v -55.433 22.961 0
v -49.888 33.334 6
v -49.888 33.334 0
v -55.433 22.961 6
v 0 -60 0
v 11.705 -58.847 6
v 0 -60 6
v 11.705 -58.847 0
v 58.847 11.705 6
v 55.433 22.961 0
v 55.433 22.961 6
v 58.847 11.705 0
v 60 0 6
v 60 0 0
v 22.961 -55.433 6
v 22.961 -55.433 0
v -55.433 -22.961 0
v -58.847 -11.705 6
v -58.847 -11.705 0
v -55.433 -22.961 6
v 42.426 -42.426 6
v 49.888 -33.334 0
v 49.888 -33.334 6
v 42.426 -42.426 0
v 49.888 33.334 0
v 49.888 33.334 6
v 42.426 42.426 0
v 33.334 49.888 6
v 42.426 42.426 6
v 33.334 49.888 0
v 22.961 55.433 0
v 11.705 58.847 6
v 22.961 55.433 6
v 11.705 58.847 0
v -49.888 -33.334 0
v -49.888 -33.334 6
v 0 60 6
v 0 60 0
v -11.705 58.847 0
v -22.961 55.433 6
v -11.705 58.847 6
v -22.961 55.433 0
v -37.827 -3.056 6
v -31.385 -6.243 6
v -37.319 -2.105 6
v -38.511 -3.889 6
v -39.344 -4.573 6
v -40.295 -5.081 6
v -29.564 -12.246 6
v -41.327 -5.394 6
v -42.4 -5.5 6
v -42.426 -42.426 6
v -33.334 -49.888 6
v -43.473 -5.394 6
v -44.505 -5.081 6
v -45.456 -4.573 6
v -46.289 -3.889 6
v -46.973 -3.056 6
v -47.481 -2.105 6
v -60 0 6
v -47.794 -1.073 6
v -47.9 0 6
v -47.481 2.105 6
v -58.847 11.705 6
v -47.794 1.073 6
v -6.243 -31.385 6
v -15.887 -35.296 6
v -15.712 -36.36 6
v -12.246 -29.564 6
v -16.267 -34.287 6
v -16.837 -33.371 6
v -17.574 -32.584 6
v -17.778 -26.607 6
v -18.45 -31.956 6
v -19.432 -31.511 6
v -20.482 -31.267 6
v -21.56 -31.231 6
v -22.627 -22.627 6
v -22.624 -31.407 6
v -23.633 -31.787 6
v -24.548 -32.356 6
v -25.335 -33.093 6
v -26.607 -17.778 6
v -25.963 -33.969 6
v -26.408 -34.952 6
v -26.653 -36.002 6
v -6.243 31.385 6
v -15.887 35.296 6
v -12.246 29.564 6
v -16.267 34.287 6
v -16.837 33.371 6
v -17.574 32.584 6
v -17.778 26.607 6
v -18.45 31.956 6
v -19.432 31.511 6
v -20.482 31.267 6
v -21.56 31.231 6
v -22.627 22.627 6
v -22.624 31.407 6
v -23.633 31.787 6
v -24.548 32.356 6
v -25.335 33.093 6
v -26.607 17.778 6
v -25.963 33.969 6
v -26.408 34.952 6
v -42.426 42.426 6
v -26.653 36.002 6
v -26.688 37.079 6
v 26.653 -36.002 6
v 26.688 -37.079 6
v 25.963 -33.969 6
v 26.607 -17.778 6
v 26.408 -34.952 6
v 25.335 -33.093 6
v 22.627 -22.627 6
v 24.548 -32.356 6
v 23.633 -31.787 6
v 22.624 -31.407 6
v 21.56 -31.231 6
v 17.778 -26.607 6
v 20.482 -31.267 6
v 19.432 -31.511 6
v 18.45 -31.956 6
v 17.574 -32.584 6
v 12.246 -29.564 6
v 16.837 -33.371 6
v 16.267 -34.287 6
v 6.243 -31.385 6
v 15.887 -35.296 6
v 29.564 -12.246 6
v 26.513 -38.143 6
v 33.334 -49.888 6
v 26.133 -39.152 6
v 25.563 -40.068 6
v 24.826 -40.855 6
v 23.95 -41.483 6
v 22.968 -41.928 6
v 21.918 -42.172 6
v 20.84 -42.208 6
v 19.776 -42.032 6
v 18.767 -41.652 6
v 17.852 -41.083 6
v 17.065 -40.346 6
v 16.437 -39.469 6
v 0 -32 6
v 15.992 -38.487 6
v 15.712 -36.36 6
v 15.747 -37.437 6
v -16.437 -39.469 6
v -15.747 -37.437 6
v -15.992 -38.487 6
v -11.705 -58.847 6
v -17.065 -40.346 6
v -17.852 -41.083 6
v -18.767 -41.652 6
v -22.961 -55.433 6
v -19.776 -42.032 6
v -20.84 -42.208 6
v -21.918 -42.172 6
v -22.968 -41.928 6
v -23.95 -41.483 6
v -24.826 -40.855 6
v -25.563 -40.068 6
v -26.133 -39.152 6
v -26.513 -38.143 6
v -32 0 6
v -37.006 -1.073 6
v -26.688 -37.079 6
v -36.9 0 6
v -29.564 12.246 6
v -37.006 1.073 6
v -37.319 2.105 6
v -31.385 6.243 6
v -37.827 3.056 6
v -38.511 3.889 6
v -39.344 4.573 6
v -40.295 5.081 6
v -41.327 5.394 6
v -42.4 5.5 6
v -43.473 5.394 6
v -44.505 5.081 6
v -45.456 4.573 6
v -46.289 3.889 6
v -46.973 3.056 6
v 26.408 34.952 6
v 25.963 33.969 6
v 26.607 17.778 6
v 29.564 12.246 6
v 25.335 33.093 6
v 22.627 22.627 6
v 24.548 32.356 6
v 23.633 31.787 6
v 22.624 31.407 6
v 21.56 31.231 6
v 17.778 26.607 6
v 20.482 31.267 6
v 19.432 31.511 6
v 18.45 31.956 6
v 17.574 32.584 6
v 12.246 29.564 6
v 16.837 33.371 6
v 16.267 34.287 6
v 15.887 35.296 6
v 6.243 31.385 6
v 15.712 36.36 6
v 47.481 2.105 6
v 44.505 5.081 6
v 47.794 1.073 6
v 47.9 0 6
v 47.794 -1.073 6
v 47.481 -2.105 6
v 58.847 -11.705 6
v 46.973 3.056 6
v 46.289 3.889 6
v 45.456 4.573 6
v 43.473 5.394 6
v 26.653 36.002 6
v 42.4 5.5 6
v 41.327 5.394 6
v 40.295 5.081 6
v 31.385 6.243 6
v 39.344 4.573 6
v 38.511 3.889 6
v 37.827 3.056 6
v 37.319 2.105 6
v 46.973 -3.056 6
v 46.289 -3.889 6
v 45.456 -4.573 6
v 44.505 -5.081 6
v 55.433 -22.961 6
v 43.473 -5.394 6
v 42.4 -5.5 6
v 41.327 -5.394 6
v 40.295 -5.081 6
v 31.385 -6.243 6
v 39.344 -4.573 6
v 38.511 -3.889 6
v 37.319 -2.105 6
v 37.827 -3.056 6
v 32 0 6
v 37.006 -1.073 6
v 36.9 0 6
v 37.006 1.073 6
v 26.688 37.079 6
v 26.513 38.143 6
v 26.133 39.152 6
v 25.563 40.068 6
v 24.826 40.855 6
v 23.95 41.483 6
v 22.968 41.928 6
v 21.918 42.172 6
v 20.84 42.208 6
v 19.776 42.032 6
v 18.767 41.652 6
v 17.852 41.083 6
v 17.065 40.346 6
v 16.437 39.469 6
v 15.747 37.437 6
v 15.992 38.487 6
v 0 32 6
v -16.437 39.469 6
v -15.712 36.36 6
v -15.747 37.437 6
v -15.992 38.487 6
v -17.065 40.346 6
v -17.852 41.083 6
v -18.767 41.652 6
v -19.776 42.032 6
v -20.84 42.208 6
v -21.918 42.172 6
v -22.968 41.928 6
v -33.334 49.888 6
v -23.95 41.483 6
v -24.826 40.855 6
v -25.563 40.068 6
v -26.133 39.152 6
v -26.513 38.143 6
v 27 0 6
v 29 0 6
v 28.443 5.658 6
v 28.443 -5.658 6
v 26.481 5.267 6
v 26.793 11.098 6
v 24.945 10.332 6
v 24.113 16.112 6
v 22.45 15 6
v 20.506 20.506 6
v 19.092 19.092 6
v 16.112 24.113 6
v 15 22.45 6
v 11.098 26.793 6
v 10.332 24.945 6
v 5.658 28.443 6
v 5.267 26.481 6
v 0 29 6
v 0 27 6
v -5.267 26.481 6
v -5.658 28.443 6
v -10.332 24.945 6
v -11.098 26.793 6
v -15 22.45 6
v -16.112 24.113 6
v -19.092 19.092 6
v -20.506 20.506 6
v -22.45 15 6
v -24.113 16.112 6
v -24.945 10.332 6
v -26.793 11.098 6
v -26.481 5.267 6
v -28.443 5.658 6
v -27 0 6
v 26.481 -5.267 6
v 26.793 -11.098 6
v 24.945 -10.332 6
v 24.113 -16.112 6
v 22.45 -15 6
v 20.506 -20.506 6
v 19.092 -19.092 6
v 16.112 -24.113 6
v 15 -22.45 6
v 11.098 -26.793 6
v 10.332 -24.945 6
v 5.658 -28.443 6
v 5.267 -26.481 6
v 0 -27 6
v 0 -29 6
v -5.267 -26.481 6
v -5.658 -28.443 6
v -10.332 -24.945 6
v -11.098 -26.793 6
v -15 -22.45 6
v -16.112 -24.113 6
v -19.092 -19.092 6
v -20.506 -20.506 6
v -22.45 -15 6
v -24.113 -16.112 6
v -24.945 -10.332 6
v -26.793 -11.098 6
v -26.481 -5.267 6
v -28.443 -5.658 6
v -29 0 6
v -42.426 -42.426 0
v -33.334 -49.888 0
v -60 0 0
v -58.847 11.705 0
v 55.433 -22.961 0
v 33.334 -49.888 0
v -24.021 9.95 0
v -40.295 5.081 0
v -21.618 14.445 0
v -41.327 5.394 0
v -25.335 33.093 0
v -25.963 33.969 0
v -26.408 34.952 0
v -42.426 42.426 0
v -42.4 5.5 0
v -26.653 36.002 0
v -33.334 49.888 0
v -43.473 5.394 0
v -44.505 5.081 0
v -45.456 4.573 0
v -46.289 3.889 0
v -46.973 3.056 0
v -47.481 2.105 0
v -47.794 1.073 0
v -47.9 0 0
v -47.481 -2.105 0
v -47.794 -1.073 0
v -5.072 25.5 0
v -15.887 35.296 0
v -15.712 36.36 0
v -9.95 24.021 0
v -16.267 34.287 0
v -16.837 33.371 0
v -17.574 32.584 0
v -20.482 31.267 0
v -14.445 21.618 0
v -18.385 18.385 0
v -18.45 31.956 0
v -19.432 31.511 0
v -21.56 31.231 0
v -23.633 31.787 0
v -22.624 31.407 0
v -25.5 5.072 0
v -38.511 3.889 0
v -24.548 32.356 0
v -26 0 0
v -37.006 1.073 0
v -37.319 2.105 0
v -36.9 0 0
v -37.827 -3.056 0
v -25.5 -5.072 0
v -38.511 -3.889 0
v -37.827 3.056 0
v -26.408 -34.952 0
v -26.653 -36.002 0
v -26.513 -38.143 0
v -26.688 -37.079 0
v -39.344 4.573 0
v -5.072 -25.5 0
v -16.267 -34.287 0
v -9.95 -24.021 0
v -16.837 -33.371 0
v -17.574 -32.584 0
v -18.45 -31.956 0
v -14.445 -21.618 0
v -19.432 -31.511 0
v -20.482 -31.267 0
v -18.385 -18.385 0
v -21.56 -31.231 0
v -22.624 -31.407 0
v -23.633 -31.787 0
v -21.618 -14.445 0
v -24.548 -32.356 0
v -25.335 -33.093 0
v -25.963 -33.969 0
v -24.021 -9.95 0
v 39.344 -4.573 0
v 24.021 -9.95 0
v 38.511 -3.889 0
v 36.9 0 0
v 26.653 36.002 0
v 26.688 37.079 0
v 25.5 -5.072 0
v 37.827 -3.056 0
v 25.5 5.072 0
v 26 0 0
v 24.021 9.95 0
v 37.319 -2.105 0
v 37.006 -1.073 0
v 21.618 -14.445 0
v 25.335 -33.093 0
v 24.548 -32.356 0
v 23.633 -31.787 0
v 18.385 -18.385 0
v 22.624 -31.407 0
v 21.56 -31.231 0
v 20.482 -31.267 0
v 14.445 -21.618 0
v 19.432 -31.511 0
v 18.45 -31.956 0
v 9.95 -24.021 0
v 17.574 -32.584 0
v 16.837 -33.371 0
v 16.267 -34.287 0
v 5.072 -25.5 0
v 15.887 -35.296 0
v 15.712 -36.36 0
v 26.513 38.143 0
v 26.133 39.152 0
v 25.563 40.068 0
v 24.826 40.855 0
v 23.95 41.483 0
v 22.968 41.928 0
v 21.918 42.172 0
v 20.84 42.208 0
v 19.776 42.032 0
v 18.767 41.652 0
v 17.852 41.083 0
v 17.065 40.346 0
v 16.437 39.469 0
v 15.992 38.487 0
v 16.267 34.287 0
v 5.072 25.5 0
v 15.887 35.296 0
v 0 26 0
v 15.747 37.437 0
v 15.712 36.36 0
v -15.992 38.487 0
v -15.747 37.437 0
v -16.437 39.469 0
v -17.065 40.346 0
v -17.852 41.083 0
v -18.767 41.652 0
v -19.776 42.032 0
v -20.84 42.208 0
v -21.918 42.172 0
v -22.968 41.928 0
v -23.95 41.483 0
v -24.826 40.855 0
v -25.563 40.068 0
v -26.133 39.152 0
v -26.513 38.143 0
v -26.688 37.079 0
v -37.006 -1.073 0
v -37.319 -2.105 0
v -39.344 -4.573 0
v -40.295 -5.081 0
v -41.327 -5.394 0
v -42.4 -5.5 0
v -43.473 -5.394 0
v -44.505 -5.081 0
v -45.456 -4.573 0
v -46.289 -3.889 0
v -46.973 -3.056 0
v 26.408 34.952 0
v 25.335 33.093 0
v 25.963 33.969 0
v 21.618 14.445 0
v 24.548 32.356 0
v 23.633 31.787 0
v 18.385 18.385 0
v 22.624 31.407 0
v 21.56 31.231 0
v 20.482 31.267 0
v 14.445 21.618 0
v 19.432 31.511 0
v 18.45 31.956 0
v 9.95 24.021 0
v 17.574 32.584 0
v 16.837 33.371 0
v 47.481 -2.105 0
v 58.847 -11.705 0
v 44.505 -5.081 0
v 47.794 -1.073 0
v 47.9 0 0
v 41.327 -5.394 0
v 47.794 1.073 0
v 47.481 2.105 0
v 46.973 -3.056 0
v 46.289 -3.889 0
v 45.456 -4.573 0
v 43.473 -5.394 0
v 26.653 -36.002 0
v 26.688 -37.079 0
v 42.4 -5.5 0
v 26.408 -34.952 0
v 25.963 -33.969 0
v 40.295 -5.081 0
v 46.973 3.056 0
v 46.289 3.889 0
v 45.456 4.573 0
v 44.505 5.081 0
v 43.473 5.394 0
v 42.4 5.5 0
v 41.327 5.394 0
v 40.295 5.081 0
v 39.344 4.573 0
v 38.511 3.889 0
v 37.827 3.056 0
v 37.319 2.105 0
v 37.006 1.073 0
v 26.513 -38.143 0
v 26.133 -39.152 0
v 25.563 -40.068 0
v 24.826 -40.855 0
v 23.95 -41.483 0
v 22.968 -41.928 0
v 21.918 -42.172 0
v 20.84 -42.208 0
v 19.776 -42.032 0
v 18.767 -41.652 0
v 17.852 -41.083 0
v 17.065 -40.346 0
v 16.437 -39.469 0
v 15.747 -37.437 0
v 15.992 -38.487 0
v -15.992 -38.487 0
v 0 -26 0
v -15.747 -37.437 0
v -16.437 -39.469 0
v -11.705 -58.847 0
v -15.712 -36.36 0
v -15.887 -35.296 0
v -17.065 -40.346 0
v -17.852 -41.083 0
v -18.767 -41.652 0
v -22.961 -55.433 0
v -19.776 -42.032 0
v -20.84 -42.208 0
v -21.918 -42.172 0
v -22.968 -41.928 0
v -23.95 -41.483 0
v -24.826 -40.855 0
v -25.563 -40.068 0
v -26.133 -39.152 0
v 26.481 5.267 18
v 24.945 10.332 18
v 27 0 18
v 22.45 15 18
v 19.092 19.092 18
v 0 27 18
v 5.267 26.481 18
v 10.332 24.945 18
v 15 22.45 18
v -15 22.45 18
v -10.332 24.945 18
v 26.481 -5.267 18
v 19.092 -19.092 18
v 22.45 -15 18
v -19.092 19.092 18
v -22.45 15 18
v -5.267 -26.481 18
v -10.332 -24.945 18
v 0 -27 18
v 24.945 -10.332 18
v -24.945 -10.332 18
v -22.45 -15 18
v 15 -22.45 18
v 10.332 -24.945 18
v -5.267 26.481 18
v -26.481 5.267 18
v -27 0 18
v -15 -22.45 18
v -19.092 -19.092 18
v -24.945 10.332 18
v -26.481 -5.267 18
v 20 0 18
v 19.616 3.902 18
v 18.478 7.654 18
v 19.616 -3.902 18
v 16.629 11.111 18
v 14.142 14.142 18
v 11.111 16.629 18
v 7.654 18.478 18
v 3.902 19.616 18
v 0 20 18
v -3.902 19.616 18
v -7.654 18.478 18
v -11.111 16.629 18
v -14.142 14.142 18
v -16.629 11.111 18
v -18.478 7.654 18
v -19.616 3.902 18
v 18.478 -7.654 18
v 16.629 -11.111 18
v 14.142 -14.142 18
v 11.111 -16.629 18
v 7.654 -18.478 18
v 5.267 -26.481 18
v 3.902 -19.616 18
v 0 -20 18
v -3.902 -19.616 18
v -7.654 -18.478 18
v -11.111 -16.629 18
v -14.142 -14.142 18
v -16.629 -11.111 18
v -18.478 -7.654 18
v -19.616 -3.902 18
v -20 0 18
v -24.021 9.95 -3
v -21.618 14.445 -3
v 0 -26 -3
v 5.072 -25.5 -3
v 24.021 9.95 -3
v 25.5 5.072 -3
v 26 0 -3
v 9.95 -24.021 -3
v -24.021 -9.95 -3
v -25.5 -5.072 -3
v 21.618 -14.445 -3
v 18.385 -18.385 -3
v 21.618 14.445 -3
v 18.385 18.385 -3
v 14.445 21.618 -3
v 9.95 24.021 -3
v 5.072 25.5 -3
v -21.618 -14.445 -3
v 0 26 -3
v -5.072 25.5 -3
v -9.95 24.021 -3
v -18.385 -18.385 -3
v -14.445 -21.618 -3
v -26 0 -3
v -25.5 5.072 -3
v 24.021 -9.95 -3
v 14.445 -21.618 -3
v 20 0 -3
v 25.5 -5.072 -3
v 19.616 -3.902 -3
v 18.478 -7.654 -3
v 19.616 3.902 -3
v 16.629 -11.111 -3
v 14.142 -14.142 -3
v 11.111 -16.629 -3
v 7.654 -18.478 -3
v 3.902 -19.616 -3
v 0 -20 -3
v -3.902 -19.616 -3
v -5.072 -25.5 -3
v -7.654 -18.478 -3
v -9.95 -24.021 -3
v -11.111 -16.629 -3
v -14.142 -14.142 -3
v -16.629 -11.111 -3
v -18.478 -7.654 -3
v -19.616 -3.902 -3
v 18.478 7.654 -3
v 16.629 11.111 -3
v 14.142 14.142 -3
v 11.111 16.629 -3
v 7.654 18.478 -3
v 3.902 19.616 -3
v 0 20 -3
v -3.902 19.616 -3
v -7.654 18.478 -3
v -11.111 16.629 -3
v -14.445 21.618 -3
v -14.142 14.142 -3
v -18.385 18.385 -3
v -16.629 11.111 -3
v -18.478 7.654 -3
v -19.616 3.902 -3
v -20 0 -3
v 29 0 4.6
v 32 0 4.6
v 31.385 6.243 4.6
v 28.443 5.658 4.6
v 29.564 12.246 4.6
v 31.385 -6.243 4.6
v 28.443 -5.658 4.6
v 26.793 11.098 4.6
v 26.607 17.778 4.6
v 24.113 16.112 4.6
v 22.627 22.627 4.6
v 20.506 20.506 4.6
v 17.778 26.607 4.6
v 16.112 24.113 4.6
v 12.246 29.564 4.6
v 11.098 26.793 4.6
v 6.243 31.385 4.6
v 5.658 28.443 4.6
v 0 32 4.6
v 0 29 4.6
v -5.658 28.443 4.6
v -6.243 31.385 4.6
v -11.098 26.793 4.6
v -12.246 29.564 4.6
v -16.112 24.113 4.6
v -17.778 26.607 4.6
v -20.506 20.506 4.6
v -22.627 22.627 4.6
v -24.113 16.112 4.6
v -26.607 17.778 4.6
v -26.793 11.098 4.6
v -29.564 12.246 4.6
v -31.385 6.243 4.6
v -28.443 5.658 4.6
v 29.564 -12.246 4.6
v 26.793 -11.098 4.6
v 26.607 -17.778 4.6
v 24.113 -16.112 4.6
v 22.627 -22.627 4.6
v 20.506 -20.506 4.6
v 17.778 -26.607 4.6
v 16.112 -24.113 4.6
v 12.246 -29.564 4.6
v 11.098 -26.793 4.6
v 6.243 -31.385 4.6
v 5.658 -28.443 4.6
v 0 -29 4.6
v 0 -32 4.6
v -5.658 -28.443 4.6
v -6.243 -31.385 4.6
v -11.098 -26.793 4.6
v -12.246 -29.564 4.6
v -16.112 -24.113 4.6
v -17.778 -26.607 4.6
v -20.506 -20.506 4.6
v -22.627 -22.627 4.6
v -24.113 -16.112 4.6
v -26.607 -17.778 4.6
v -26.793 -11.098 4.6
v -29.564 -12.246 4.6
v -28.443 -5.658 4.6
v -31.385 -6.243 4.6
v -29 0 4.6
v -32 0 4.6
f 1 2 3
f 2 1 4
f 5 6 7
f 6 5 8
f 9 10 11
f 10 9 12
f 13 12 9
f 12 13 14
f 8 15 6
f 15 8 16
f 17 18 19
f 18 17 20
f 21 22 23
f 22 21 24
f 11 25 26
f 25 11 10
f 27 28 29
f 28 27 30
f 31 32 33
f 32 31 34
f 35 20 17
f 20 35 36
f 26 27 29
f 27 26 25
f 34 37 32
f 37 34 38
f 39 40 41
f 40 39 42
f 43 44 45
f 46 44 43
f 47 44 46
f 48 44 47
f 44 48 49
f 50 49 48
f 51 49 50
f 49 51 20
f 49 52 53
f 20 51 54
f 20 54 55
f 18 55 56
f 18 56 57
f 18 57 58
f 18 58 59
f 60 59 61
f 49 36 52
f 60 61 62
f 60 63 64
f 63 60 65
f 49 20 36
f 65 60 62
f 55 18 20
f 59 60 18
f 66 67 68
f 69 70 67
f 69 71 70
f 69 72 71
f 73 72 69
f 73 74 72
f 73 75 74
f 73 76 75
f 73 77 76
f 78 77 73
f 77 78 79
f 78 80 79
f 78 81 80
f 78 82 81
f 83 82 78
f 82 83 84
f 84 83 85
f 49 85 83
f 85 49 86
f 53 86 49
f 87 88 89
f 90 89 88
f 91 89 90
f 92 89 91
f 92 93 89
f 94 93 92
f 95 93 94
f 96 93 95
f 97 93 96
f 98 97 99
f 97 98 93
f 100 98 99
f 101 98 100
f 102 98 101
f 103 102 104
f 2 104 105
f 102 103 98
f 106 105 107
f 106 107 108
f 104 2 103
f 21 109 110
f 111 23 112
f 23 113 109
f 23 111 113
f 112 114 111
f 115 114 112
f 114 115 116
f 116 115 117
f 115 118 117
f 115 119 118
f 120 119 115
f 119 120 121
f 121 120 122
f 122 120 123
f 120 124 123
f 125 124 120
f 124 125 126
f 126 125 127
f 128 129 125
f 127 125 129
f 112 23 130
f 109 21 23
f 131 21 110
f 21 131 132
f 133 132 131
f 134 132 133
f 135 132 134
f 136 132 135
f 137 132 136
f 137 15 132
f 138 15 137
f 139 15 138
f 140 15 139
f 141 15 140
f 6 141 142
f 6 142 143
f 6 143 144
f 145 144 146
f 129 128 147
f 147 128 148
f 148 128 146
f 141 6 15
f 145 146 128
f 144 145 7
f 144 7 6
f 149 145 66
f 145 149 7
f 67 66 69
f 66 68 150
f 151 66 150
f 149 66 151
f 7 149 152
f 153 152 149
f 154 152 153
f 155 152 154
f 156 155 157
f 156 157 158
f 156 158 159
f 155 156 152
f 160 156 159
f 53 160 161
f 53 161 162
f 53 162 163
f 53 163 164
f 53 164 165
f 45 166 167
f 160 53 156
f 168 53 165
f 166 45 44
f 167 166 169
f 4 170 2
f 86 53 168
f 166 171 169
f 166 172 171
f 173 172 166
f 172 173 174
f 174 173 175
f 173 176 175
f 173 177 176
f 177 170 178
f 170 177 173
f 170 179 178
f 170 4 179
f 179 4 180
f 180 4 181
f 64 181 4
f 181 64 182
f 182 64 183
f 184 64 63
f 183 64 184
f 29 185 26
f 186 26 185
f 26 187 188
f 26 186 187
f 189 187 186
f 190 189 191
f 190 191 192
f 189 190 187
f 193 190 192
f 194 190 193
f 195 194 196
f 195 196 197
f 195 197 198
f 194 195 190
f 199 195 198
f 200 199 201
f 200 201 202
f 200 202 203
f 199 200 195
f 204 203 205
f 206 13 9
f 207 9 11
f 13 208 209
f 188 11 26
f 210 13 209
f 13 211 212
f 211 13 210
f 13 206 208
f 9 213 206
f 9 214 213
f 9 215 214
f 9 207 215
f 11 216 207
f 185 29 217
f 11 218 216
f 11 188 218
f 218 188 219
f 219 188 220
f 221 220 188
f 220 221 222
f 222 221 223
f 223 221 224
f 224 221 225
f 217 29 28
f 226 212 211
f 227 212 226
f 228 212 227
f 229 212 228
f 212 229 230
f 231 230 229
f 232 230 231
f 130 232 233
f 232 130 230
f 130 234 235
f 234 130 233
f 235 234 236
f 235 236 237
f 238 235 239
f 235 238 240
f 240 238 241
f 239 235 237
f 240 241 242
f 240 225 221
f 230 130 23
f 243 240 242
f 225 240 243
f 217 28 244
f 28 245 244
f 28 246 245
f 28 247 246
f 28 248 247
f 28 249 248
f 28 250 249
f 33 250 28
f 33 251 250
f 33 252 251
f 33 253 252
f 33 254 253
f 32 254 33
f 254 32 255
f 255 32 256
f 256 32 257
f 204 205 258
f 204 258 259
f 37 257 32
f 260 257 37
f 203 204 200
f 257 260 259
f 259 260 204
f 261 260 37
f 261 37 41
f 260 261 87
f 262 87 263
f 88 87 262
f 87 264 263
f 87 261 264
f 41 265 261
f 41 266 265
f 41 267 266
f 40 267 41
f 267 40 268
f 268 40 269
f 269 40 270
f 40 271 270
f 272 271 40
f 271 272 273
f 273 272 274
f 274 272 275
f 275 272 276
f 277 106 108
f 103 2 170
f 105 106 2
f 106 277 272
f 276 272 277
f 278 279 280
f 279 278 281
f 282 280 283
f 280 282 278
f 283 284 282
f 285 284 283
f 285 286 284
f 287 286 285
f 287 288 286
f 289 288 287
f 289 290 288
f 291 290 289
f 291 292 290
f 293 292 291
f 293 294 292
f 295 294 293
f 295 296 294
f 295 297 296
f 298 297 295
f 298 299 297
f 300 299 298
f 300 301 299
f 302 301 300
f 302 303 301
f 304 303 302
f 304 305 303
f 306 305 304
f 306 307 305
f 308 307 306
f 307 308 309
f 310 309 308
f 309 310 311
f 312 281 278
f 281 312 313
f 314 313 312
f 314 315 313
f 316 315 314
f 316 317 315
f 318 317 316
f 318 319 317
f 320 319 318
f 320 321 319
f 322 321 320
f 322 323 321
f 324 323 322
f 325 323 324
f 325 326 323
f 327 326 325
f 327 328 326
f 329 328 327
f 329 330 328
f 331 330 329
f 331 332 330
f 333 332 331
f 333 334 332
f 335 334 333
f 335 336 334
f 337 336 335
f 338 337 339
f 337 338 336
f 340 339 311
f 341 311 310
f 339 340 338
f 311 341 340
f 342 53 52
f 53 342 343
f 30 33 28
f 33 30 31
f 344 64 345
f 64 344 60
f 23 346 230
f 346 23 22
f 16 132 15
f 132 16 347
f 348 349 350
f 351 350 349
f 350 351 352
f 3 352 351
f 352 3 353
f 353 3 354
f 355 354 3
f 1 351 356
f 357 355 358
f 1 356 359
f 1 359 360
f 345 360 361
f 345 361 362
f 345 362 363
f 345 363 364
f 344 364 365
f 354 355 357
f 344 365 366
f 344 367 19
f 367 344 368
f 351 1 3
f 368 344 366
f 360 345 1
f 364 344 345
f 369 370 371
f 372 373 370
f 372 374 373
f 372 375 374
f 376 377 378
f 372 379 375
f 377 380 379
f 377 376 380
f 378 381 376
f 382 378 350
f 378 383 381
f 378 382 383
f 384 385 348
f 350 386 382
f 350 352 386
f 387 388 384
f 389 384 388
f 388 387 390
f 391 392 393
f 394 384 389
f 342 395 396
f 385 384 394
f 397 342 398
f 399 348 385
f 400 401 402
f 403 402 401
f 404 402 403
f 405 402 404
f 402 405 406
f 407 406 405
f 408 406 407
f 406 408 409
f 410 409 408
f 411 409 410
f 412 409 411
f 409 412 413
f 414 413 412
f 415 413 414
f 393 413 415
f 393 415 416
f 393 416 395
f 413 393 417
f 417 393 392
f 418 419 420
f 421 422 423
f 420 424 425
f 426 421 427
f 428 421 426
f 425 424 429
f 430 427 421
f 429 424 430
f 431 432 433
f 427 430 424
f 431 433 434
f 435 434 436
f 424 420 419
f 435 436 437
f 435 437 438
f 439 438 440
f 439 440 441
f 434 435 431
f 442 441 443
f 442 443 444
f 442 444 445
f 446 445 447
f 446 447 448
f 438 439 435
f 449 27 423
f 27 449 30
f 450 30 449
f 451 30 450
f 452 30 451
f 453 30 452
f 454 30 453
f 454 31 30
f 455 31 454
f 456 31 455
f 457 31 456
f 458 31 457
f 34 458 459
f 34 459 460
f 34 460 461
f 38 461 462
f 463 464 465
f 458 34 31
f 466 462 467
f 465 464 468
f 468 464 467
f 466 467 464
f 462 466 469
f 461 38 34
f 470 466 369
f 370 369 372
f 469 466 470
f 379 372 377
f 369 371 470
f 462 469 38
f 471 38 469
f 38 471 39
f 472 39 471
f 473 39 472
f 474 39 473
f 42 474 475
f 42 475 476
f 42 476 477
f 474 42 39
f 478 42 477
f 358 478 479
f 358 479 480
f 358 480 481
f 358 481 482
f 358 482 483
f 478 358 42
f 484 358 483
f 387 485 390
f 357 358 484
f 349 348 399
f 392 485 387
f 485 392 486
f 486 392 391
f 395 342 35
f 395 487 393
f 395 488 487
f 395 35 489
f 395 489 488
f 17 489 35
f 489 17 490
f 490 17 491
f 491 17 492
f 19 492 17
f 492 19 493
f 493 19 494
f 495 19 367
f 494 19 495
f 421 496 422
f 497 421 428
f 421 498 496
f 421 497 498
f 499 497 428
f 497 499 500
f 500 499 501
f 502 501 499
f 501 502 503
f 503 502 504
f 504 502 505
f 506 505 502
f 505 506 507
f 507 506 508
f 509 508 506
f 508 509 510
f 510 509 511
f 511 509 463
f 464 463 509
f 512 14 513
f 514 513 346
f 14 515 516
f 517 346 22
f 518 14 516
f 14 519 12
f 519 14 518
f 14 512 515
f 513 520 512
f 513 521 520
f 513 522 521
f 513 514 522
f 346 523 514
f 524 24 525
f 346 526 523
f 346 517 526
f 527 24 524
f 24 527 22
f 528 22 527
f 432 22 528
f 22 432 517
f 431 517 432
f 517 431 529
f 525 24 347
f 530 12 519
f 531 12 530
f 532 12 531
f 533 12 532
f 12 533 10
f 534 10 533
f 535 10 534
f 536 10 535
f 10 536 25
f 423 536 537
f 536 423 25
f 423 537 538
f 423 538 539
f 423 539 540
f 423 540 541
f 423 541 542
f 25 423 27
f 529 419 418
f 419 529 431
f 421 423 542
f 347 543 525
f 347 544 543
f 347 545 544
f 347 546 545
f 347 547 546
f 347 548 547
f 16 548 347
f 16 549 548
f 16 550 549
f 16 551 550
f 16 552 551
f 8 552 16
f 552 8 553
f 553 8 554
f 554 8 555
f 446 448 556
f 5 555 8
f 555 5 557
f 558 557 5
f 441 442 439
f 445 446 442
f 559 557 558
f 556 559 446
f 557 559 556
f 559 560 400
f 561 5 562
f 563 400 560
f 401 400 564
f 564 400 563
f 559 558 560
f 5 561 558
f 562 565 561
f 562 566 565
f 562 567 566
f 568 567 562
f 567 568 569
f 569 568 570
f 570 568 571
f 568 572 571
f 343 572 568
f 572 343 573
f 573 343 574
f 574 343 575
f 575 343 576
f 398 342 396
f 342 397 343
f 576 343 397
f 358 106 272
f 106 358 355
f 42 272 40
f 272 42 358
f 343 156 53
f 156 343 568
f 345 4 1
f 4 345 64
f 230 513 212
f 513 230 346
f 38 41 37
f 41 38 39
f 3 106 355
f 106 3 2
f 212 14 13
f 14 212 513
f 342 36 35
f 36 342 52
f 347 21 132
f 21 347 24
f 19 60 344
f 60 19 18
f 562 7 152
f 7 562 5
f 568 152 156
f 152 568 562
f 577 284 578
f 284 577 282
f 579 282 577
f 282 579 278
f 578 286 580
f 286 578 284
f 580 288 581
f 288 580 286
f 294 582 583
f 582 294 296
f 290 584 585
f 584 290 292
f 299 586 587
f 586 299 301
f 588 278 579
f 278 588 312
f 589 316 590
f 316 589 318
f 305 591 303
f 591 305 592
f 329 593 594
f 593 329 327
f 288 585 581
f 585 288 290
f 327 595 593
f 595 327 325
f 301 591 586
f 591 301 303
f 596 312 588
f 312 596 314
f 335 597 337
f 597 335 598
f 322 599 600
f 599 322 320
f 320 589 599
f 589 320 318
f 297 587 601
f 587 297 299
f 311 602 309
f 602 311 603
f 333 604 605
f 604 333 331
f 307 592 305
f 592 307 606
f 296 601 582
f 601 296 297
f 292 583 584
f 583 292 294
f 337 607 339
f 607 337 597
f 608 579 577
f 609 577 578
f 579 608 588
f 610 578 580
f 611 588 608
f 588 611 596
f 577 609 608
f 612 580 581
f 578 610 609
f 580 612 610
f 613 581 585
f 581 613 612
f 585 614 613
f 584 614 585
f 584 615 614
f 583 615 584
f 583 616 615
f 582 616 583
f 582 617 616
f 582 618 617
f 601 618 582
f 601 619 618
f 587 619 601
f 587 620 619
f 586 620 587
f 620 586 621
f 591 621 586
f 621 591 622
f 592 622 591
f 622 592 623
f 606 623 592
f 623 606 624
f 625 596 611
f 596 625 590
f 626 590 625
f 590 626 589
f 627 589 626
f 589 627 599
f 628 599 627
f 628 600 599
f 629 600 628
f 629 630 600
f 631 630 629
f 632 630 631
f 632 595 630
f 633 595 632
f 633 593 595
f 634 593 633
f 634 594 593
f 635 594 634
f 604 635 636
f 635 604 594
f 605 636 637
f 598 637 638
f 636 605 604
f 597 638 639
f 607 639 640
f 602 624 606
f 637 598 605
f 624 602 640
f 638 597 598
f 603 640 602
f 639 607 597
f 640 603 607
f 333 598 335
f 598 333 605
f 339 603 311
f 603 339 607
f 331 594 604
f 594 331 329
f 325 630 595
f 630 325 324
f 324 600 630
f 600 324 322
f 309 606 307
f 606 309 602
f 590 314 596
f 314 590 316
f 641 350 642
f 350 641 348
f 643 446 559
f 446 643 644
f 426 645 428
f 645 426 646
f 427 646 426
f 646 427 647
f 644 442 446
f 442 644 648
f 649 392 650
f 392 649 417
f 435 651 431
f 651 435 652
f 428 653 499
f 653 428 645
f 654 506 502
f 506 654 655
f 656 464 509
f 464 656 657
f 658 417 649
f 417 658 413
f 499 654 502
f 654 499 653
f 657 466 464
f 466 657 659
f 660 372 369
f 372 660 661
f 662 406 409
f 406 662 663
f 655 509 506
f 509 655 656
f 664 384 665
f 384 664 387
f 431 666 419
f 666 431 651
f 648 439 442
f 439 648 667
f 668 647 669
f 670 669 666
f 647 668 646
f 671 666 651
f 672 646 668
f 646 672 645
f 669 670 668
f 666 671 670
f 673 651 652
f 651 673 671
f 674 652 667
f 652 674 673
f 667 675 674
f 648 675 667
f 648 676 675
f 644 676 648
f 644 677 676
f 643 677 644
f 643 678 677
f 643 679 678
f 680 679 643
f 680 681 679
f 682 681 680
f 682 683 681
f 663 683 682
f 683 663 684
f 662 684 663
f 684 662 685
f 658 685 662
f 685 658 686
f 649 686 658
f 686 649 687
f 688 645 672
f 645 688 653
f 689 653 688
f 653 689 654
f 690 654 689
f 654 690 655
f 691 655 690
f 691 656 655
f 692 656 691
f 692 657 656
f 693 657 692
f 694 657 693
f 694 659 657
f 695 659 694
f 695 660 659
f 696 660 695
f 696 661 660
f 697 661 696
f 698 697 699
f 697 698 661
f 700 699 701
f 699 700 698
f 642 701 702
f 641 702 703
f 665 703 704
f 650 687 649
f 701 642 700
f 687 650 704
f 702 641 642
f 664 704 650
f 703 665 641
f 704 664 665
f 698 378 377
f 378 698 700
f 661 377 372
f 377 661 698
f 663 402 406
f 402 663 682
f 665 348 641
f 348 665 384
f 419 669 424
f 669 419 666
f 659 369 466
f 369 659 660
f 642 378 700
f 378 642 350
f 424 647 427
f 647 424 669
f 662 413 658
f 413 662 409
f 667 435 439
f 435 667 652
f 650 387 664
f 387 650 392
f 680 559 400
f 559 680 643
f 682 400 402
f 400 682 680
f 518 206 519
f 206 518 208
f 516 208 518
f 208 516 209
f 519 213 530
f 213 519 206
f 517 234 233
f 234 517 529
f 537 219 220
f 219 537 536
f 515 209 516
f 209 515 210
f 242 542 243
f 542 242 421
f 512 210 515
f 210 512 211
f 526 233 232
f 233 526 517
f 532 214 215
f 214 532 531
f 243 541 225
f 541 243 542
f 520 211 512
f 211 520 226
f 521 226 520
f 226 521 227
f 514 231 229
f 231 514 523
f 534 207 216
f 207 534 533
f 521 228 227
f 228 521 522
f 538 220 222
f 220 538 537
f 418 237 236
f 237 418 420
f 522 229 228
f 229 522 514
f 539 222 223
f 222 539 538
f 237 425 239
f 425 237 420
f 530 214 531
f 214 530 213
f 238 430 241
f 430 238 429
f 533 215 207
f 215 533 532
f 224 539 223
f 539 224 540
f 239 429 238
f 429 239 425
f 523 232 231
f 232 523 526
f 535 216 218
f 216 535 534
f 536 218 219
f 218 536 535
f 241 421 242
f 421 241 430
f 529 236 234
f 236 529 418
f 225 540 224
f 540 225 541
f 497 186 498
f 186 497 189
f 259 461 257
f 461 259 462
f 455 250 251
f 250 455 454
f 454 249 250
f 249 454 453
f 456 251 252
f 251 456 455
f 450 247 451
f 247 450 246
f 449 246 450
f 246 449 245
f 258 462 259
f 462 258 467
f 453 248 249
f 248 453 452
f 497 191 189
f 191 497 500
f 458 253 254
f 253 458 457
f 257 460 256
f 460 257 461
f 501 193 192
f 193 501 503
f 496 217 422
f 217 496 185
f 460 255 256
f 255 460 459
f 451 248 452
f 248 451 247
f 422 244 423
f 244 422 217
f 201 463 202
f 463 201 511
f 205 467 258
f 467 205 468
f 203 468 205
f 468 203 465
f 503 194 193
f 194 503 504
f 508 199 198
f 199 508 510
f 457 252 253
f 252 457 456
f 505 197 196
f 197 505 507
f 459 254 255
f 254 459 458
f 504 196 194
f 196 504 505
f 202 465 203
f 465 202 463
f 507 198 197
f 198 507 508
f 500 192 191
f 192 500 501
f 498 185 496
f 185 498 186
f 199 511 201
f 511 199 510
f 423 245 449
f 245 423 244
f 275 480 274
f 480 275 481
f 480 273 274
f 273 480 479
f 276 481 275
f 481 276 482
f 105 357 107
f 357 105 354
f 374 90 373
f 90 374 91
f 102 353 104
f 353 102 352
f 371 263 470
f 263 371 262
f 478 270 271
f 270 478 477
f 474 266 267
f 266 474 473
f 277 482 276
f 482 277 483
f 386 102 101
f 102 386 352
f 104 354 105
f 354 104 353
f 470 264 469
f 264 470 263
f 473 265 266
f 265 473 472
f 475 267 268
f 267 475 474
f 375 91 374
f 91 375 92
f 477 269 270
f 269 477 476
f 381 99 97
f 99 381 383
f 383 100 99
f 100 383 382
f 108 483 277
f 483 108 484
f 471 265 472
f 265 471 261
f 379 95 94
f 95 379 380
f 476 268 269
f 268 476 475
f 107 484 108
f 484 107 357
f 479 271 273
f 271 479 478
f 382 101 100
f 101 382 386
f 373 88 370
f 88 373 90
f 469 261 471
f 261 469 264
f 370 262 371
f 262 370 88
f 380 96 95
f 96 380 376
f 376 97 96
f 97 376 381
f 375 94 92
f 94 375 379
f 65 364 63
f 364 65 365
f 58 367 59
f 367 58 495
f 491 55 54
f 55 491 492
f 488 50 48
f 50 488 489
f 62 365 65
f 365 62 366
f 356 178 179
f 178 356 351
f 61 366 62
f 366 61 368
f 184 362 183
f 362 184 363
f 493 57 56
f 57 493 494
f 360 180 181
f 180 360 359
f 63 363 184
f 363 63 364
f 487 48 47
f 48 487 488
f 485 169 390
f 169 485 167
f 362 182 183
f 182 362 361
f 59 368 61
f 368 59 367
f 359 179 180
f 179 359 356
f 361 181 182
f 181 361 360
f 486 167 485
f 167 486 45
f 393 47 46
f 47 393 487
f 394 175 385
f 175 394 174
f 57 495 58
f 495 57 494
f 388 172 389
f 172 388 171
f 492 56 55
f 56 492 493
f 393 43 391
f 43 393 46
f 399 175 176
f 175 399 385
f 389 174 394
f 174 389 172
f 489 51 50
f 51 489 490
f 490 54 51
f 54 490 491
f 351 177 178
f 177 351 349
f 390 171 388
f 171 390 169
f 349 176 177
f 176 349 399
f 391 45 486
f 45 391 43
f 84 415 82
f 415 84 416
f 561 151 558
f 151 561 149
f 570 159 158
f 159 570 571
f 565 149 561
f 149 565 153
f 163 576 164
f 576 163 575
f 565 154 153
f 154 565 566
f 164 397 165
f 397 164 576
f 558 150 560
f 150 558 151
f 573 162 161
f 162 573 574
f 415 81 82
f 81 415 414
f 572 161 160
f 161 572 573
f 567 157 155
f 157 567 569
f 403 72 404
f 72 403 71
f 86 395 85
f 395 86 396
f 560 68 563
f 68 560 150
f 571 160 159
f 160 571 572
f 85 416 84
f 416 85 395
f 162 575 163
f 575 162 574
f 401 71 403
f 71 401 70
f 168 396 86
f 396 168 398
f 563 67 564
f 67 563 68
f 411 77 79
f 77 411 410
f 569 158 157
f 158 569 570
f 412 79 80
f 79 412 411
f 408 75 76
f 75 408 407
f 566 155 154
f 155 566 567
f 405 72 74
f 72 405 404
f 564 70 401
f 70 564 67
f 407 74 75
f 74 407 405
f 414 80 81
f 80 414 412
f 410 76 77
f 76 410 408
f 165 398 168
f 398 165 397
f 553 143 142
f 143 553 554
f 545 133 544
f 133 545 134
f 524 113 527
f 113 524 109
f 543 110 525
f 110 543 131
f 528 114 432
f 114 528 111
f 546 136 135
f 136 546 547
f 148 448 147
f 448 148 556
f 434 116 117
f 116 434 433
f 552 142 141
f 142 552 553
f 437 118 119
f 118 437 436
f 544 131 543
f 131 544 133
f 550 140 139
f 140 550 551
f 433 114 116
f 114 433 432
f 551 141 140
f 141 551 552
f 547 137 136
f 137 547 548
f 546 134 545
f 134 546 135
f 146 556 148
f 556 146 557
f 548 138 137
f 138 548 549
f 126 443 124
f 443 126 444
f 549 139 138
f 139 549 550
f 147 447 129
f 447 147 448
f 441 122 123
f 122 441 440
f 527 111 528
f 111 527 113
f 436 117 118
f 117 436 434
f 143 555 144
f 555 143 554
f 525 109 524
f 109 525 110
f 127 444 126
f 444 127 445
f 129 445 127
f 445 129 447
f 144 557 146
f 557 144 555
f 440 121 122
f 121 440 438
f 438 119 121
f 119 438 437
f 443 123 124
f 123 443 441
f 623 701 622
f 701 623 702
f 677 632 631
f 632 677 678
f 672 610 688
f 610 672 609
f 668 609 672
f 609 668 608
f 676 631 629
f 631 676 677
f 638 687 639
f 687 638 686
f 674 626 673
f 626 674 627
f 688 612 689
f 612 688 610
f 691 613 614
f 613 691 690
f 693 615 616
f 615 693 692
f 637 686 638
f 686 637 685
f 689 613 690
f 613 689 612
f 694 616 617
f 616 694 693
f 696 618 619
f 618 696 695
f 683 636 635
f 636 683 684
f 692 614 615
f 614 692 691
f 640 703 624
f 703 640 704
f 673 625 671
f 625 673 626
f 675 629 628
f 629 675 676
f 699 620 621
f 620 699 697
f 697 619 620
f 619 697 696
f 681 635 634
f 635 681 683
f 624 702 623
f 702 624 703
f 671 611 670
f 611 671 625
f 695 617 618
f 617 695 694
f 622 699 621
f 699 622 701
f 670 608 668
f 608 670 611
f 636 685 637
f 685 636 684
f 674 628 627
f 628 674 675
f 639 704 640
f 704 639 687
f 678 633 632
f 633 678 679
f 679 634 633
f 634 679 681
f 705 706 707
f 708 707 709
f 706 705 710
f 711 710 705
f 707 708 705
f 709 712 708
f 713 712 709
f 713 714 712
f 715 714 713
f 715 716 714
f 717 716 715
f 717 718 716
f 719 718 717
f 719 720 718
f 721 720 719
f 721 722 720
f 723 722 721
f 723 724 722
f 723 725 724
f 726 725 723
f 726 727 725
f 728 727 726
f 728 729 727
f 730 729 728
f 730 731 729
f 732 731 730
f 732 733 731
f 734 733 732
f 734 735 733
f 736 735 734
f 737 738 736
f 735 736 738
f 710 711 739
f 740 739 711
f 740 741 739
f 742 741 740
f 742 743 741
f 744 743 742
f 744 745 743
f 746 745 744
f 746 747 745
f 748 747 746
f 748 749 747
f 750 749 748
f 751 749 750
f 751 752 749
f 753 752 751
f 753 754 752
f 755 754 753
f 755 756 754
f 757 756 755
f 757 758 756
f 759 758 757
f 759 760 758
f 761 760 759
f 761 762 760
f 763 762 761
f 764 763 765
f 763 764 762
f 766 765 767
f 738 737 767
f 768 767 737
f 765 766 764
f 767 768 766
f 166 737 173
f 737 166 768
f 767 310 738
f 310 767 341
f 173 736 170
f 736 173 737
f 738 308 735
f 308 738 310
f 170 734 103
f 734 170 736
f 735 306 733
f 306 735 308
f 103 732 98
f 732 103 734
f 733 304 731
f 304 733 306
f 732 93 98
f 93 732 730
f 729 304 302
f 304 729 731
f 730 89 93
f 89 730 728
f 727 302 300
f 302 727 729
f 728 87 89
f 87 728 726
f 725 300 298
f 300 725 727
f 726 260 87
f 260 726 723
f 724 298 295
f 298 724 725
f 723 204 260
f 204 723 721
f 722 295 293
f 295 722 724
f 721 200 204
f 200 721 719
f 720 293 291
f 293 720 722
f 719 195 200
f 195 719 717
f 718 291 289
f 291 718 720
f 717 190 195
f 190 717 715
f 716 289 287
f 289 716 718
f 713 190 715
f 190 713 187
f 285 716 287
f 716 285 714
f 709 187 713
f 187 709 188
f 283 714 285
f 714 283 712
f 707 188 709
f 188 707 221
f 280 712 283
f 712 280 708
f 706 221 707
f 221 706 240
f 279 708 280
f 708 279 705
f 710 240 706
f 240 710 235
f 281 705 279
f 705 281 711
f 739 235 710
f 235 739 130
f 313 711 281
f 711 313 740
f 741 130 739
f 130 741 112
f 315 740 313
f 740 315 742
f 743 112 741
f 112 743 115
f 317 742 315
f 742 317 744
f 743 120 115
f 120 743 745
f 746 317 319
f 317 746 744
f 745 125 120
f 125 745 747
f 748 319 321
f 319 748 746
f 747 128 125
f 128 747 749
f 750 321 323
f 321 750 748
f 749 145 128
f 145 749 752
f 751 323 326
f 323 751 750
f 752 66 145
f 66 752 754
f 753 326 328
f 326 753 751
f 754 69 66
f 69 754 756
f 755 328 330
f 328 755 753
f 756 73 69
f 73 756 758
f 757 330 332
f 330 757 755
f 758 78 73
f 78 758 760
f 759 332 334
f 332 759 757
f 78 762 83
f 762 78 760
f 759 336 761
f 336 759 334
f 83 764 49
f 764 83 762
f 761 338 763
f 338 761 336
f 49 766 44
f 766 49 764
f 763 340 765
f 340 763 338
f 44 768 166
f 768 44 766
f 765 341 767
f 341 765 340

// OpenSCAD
$fn = 32;

// ----------------------------------------------------------------------
// Bolt-circle flange: 120 mm outside, 6 bolt holes, bore 40 mm
// ----------------------------------------------------------------------

// --- parameters (mm) ---
flange_d = 120;           // flange outside diameter
flange_t = 6;             // flange thickness
bolts = 6;                // number of bolt holes
bolt_d = 11;              // bolt clearance
bolt_r = 42.4;            // bolt circle radius
bore_d = 40;              // centre bore
hub_d = 54;               // raised hub diameter
hub_h = 12;               // raised hub height
spigot_d = 52;            // spigot diameter
spigot_h = 4;             // spigot height below the flange
sink = 1;                 // overlap into the flange
groove_w = 3;             // gasket groove width
groove_d = 1.4;           // gasket groove depth
groove_r = 29;            // groove radius
groove_z = 4.6;           // groove floor depth from the face

module body() {
  cylinder(h = flange_t, d = flange_d);
  /* raised hub, sunk 1 mm into the flange */
  translate([0, 0, flange_t - 1]) cylinder(h = hub_h + 1, d = hub_d);
  /* spigot on the back face, sunk into the flange */
  translate([0, 0, -spigot_h + sink]) cylinder(h = spigot_h, d = spigot_d);
}

difference() {
  body();
  /* bolt circle */
  for (i = [0 : bolts - 1]) rotate([0, 0, i * 360 / bolts]) translate([bolt_r, 0, -spigot_h - 1]) cylinder(h = flange_t + hub_h + spigot_h + 3, d = bolt_d);
  translate([0, 0, -spigot_h - 1]) cylinder(h = flange_t + hub_h + spigot_h + 3, d = bore_d);
  /* gasket groove on the front face */
  rotate_extrude() translate([groove_r, groove_z]) square([groove_w, groove_d + 1]);
}
